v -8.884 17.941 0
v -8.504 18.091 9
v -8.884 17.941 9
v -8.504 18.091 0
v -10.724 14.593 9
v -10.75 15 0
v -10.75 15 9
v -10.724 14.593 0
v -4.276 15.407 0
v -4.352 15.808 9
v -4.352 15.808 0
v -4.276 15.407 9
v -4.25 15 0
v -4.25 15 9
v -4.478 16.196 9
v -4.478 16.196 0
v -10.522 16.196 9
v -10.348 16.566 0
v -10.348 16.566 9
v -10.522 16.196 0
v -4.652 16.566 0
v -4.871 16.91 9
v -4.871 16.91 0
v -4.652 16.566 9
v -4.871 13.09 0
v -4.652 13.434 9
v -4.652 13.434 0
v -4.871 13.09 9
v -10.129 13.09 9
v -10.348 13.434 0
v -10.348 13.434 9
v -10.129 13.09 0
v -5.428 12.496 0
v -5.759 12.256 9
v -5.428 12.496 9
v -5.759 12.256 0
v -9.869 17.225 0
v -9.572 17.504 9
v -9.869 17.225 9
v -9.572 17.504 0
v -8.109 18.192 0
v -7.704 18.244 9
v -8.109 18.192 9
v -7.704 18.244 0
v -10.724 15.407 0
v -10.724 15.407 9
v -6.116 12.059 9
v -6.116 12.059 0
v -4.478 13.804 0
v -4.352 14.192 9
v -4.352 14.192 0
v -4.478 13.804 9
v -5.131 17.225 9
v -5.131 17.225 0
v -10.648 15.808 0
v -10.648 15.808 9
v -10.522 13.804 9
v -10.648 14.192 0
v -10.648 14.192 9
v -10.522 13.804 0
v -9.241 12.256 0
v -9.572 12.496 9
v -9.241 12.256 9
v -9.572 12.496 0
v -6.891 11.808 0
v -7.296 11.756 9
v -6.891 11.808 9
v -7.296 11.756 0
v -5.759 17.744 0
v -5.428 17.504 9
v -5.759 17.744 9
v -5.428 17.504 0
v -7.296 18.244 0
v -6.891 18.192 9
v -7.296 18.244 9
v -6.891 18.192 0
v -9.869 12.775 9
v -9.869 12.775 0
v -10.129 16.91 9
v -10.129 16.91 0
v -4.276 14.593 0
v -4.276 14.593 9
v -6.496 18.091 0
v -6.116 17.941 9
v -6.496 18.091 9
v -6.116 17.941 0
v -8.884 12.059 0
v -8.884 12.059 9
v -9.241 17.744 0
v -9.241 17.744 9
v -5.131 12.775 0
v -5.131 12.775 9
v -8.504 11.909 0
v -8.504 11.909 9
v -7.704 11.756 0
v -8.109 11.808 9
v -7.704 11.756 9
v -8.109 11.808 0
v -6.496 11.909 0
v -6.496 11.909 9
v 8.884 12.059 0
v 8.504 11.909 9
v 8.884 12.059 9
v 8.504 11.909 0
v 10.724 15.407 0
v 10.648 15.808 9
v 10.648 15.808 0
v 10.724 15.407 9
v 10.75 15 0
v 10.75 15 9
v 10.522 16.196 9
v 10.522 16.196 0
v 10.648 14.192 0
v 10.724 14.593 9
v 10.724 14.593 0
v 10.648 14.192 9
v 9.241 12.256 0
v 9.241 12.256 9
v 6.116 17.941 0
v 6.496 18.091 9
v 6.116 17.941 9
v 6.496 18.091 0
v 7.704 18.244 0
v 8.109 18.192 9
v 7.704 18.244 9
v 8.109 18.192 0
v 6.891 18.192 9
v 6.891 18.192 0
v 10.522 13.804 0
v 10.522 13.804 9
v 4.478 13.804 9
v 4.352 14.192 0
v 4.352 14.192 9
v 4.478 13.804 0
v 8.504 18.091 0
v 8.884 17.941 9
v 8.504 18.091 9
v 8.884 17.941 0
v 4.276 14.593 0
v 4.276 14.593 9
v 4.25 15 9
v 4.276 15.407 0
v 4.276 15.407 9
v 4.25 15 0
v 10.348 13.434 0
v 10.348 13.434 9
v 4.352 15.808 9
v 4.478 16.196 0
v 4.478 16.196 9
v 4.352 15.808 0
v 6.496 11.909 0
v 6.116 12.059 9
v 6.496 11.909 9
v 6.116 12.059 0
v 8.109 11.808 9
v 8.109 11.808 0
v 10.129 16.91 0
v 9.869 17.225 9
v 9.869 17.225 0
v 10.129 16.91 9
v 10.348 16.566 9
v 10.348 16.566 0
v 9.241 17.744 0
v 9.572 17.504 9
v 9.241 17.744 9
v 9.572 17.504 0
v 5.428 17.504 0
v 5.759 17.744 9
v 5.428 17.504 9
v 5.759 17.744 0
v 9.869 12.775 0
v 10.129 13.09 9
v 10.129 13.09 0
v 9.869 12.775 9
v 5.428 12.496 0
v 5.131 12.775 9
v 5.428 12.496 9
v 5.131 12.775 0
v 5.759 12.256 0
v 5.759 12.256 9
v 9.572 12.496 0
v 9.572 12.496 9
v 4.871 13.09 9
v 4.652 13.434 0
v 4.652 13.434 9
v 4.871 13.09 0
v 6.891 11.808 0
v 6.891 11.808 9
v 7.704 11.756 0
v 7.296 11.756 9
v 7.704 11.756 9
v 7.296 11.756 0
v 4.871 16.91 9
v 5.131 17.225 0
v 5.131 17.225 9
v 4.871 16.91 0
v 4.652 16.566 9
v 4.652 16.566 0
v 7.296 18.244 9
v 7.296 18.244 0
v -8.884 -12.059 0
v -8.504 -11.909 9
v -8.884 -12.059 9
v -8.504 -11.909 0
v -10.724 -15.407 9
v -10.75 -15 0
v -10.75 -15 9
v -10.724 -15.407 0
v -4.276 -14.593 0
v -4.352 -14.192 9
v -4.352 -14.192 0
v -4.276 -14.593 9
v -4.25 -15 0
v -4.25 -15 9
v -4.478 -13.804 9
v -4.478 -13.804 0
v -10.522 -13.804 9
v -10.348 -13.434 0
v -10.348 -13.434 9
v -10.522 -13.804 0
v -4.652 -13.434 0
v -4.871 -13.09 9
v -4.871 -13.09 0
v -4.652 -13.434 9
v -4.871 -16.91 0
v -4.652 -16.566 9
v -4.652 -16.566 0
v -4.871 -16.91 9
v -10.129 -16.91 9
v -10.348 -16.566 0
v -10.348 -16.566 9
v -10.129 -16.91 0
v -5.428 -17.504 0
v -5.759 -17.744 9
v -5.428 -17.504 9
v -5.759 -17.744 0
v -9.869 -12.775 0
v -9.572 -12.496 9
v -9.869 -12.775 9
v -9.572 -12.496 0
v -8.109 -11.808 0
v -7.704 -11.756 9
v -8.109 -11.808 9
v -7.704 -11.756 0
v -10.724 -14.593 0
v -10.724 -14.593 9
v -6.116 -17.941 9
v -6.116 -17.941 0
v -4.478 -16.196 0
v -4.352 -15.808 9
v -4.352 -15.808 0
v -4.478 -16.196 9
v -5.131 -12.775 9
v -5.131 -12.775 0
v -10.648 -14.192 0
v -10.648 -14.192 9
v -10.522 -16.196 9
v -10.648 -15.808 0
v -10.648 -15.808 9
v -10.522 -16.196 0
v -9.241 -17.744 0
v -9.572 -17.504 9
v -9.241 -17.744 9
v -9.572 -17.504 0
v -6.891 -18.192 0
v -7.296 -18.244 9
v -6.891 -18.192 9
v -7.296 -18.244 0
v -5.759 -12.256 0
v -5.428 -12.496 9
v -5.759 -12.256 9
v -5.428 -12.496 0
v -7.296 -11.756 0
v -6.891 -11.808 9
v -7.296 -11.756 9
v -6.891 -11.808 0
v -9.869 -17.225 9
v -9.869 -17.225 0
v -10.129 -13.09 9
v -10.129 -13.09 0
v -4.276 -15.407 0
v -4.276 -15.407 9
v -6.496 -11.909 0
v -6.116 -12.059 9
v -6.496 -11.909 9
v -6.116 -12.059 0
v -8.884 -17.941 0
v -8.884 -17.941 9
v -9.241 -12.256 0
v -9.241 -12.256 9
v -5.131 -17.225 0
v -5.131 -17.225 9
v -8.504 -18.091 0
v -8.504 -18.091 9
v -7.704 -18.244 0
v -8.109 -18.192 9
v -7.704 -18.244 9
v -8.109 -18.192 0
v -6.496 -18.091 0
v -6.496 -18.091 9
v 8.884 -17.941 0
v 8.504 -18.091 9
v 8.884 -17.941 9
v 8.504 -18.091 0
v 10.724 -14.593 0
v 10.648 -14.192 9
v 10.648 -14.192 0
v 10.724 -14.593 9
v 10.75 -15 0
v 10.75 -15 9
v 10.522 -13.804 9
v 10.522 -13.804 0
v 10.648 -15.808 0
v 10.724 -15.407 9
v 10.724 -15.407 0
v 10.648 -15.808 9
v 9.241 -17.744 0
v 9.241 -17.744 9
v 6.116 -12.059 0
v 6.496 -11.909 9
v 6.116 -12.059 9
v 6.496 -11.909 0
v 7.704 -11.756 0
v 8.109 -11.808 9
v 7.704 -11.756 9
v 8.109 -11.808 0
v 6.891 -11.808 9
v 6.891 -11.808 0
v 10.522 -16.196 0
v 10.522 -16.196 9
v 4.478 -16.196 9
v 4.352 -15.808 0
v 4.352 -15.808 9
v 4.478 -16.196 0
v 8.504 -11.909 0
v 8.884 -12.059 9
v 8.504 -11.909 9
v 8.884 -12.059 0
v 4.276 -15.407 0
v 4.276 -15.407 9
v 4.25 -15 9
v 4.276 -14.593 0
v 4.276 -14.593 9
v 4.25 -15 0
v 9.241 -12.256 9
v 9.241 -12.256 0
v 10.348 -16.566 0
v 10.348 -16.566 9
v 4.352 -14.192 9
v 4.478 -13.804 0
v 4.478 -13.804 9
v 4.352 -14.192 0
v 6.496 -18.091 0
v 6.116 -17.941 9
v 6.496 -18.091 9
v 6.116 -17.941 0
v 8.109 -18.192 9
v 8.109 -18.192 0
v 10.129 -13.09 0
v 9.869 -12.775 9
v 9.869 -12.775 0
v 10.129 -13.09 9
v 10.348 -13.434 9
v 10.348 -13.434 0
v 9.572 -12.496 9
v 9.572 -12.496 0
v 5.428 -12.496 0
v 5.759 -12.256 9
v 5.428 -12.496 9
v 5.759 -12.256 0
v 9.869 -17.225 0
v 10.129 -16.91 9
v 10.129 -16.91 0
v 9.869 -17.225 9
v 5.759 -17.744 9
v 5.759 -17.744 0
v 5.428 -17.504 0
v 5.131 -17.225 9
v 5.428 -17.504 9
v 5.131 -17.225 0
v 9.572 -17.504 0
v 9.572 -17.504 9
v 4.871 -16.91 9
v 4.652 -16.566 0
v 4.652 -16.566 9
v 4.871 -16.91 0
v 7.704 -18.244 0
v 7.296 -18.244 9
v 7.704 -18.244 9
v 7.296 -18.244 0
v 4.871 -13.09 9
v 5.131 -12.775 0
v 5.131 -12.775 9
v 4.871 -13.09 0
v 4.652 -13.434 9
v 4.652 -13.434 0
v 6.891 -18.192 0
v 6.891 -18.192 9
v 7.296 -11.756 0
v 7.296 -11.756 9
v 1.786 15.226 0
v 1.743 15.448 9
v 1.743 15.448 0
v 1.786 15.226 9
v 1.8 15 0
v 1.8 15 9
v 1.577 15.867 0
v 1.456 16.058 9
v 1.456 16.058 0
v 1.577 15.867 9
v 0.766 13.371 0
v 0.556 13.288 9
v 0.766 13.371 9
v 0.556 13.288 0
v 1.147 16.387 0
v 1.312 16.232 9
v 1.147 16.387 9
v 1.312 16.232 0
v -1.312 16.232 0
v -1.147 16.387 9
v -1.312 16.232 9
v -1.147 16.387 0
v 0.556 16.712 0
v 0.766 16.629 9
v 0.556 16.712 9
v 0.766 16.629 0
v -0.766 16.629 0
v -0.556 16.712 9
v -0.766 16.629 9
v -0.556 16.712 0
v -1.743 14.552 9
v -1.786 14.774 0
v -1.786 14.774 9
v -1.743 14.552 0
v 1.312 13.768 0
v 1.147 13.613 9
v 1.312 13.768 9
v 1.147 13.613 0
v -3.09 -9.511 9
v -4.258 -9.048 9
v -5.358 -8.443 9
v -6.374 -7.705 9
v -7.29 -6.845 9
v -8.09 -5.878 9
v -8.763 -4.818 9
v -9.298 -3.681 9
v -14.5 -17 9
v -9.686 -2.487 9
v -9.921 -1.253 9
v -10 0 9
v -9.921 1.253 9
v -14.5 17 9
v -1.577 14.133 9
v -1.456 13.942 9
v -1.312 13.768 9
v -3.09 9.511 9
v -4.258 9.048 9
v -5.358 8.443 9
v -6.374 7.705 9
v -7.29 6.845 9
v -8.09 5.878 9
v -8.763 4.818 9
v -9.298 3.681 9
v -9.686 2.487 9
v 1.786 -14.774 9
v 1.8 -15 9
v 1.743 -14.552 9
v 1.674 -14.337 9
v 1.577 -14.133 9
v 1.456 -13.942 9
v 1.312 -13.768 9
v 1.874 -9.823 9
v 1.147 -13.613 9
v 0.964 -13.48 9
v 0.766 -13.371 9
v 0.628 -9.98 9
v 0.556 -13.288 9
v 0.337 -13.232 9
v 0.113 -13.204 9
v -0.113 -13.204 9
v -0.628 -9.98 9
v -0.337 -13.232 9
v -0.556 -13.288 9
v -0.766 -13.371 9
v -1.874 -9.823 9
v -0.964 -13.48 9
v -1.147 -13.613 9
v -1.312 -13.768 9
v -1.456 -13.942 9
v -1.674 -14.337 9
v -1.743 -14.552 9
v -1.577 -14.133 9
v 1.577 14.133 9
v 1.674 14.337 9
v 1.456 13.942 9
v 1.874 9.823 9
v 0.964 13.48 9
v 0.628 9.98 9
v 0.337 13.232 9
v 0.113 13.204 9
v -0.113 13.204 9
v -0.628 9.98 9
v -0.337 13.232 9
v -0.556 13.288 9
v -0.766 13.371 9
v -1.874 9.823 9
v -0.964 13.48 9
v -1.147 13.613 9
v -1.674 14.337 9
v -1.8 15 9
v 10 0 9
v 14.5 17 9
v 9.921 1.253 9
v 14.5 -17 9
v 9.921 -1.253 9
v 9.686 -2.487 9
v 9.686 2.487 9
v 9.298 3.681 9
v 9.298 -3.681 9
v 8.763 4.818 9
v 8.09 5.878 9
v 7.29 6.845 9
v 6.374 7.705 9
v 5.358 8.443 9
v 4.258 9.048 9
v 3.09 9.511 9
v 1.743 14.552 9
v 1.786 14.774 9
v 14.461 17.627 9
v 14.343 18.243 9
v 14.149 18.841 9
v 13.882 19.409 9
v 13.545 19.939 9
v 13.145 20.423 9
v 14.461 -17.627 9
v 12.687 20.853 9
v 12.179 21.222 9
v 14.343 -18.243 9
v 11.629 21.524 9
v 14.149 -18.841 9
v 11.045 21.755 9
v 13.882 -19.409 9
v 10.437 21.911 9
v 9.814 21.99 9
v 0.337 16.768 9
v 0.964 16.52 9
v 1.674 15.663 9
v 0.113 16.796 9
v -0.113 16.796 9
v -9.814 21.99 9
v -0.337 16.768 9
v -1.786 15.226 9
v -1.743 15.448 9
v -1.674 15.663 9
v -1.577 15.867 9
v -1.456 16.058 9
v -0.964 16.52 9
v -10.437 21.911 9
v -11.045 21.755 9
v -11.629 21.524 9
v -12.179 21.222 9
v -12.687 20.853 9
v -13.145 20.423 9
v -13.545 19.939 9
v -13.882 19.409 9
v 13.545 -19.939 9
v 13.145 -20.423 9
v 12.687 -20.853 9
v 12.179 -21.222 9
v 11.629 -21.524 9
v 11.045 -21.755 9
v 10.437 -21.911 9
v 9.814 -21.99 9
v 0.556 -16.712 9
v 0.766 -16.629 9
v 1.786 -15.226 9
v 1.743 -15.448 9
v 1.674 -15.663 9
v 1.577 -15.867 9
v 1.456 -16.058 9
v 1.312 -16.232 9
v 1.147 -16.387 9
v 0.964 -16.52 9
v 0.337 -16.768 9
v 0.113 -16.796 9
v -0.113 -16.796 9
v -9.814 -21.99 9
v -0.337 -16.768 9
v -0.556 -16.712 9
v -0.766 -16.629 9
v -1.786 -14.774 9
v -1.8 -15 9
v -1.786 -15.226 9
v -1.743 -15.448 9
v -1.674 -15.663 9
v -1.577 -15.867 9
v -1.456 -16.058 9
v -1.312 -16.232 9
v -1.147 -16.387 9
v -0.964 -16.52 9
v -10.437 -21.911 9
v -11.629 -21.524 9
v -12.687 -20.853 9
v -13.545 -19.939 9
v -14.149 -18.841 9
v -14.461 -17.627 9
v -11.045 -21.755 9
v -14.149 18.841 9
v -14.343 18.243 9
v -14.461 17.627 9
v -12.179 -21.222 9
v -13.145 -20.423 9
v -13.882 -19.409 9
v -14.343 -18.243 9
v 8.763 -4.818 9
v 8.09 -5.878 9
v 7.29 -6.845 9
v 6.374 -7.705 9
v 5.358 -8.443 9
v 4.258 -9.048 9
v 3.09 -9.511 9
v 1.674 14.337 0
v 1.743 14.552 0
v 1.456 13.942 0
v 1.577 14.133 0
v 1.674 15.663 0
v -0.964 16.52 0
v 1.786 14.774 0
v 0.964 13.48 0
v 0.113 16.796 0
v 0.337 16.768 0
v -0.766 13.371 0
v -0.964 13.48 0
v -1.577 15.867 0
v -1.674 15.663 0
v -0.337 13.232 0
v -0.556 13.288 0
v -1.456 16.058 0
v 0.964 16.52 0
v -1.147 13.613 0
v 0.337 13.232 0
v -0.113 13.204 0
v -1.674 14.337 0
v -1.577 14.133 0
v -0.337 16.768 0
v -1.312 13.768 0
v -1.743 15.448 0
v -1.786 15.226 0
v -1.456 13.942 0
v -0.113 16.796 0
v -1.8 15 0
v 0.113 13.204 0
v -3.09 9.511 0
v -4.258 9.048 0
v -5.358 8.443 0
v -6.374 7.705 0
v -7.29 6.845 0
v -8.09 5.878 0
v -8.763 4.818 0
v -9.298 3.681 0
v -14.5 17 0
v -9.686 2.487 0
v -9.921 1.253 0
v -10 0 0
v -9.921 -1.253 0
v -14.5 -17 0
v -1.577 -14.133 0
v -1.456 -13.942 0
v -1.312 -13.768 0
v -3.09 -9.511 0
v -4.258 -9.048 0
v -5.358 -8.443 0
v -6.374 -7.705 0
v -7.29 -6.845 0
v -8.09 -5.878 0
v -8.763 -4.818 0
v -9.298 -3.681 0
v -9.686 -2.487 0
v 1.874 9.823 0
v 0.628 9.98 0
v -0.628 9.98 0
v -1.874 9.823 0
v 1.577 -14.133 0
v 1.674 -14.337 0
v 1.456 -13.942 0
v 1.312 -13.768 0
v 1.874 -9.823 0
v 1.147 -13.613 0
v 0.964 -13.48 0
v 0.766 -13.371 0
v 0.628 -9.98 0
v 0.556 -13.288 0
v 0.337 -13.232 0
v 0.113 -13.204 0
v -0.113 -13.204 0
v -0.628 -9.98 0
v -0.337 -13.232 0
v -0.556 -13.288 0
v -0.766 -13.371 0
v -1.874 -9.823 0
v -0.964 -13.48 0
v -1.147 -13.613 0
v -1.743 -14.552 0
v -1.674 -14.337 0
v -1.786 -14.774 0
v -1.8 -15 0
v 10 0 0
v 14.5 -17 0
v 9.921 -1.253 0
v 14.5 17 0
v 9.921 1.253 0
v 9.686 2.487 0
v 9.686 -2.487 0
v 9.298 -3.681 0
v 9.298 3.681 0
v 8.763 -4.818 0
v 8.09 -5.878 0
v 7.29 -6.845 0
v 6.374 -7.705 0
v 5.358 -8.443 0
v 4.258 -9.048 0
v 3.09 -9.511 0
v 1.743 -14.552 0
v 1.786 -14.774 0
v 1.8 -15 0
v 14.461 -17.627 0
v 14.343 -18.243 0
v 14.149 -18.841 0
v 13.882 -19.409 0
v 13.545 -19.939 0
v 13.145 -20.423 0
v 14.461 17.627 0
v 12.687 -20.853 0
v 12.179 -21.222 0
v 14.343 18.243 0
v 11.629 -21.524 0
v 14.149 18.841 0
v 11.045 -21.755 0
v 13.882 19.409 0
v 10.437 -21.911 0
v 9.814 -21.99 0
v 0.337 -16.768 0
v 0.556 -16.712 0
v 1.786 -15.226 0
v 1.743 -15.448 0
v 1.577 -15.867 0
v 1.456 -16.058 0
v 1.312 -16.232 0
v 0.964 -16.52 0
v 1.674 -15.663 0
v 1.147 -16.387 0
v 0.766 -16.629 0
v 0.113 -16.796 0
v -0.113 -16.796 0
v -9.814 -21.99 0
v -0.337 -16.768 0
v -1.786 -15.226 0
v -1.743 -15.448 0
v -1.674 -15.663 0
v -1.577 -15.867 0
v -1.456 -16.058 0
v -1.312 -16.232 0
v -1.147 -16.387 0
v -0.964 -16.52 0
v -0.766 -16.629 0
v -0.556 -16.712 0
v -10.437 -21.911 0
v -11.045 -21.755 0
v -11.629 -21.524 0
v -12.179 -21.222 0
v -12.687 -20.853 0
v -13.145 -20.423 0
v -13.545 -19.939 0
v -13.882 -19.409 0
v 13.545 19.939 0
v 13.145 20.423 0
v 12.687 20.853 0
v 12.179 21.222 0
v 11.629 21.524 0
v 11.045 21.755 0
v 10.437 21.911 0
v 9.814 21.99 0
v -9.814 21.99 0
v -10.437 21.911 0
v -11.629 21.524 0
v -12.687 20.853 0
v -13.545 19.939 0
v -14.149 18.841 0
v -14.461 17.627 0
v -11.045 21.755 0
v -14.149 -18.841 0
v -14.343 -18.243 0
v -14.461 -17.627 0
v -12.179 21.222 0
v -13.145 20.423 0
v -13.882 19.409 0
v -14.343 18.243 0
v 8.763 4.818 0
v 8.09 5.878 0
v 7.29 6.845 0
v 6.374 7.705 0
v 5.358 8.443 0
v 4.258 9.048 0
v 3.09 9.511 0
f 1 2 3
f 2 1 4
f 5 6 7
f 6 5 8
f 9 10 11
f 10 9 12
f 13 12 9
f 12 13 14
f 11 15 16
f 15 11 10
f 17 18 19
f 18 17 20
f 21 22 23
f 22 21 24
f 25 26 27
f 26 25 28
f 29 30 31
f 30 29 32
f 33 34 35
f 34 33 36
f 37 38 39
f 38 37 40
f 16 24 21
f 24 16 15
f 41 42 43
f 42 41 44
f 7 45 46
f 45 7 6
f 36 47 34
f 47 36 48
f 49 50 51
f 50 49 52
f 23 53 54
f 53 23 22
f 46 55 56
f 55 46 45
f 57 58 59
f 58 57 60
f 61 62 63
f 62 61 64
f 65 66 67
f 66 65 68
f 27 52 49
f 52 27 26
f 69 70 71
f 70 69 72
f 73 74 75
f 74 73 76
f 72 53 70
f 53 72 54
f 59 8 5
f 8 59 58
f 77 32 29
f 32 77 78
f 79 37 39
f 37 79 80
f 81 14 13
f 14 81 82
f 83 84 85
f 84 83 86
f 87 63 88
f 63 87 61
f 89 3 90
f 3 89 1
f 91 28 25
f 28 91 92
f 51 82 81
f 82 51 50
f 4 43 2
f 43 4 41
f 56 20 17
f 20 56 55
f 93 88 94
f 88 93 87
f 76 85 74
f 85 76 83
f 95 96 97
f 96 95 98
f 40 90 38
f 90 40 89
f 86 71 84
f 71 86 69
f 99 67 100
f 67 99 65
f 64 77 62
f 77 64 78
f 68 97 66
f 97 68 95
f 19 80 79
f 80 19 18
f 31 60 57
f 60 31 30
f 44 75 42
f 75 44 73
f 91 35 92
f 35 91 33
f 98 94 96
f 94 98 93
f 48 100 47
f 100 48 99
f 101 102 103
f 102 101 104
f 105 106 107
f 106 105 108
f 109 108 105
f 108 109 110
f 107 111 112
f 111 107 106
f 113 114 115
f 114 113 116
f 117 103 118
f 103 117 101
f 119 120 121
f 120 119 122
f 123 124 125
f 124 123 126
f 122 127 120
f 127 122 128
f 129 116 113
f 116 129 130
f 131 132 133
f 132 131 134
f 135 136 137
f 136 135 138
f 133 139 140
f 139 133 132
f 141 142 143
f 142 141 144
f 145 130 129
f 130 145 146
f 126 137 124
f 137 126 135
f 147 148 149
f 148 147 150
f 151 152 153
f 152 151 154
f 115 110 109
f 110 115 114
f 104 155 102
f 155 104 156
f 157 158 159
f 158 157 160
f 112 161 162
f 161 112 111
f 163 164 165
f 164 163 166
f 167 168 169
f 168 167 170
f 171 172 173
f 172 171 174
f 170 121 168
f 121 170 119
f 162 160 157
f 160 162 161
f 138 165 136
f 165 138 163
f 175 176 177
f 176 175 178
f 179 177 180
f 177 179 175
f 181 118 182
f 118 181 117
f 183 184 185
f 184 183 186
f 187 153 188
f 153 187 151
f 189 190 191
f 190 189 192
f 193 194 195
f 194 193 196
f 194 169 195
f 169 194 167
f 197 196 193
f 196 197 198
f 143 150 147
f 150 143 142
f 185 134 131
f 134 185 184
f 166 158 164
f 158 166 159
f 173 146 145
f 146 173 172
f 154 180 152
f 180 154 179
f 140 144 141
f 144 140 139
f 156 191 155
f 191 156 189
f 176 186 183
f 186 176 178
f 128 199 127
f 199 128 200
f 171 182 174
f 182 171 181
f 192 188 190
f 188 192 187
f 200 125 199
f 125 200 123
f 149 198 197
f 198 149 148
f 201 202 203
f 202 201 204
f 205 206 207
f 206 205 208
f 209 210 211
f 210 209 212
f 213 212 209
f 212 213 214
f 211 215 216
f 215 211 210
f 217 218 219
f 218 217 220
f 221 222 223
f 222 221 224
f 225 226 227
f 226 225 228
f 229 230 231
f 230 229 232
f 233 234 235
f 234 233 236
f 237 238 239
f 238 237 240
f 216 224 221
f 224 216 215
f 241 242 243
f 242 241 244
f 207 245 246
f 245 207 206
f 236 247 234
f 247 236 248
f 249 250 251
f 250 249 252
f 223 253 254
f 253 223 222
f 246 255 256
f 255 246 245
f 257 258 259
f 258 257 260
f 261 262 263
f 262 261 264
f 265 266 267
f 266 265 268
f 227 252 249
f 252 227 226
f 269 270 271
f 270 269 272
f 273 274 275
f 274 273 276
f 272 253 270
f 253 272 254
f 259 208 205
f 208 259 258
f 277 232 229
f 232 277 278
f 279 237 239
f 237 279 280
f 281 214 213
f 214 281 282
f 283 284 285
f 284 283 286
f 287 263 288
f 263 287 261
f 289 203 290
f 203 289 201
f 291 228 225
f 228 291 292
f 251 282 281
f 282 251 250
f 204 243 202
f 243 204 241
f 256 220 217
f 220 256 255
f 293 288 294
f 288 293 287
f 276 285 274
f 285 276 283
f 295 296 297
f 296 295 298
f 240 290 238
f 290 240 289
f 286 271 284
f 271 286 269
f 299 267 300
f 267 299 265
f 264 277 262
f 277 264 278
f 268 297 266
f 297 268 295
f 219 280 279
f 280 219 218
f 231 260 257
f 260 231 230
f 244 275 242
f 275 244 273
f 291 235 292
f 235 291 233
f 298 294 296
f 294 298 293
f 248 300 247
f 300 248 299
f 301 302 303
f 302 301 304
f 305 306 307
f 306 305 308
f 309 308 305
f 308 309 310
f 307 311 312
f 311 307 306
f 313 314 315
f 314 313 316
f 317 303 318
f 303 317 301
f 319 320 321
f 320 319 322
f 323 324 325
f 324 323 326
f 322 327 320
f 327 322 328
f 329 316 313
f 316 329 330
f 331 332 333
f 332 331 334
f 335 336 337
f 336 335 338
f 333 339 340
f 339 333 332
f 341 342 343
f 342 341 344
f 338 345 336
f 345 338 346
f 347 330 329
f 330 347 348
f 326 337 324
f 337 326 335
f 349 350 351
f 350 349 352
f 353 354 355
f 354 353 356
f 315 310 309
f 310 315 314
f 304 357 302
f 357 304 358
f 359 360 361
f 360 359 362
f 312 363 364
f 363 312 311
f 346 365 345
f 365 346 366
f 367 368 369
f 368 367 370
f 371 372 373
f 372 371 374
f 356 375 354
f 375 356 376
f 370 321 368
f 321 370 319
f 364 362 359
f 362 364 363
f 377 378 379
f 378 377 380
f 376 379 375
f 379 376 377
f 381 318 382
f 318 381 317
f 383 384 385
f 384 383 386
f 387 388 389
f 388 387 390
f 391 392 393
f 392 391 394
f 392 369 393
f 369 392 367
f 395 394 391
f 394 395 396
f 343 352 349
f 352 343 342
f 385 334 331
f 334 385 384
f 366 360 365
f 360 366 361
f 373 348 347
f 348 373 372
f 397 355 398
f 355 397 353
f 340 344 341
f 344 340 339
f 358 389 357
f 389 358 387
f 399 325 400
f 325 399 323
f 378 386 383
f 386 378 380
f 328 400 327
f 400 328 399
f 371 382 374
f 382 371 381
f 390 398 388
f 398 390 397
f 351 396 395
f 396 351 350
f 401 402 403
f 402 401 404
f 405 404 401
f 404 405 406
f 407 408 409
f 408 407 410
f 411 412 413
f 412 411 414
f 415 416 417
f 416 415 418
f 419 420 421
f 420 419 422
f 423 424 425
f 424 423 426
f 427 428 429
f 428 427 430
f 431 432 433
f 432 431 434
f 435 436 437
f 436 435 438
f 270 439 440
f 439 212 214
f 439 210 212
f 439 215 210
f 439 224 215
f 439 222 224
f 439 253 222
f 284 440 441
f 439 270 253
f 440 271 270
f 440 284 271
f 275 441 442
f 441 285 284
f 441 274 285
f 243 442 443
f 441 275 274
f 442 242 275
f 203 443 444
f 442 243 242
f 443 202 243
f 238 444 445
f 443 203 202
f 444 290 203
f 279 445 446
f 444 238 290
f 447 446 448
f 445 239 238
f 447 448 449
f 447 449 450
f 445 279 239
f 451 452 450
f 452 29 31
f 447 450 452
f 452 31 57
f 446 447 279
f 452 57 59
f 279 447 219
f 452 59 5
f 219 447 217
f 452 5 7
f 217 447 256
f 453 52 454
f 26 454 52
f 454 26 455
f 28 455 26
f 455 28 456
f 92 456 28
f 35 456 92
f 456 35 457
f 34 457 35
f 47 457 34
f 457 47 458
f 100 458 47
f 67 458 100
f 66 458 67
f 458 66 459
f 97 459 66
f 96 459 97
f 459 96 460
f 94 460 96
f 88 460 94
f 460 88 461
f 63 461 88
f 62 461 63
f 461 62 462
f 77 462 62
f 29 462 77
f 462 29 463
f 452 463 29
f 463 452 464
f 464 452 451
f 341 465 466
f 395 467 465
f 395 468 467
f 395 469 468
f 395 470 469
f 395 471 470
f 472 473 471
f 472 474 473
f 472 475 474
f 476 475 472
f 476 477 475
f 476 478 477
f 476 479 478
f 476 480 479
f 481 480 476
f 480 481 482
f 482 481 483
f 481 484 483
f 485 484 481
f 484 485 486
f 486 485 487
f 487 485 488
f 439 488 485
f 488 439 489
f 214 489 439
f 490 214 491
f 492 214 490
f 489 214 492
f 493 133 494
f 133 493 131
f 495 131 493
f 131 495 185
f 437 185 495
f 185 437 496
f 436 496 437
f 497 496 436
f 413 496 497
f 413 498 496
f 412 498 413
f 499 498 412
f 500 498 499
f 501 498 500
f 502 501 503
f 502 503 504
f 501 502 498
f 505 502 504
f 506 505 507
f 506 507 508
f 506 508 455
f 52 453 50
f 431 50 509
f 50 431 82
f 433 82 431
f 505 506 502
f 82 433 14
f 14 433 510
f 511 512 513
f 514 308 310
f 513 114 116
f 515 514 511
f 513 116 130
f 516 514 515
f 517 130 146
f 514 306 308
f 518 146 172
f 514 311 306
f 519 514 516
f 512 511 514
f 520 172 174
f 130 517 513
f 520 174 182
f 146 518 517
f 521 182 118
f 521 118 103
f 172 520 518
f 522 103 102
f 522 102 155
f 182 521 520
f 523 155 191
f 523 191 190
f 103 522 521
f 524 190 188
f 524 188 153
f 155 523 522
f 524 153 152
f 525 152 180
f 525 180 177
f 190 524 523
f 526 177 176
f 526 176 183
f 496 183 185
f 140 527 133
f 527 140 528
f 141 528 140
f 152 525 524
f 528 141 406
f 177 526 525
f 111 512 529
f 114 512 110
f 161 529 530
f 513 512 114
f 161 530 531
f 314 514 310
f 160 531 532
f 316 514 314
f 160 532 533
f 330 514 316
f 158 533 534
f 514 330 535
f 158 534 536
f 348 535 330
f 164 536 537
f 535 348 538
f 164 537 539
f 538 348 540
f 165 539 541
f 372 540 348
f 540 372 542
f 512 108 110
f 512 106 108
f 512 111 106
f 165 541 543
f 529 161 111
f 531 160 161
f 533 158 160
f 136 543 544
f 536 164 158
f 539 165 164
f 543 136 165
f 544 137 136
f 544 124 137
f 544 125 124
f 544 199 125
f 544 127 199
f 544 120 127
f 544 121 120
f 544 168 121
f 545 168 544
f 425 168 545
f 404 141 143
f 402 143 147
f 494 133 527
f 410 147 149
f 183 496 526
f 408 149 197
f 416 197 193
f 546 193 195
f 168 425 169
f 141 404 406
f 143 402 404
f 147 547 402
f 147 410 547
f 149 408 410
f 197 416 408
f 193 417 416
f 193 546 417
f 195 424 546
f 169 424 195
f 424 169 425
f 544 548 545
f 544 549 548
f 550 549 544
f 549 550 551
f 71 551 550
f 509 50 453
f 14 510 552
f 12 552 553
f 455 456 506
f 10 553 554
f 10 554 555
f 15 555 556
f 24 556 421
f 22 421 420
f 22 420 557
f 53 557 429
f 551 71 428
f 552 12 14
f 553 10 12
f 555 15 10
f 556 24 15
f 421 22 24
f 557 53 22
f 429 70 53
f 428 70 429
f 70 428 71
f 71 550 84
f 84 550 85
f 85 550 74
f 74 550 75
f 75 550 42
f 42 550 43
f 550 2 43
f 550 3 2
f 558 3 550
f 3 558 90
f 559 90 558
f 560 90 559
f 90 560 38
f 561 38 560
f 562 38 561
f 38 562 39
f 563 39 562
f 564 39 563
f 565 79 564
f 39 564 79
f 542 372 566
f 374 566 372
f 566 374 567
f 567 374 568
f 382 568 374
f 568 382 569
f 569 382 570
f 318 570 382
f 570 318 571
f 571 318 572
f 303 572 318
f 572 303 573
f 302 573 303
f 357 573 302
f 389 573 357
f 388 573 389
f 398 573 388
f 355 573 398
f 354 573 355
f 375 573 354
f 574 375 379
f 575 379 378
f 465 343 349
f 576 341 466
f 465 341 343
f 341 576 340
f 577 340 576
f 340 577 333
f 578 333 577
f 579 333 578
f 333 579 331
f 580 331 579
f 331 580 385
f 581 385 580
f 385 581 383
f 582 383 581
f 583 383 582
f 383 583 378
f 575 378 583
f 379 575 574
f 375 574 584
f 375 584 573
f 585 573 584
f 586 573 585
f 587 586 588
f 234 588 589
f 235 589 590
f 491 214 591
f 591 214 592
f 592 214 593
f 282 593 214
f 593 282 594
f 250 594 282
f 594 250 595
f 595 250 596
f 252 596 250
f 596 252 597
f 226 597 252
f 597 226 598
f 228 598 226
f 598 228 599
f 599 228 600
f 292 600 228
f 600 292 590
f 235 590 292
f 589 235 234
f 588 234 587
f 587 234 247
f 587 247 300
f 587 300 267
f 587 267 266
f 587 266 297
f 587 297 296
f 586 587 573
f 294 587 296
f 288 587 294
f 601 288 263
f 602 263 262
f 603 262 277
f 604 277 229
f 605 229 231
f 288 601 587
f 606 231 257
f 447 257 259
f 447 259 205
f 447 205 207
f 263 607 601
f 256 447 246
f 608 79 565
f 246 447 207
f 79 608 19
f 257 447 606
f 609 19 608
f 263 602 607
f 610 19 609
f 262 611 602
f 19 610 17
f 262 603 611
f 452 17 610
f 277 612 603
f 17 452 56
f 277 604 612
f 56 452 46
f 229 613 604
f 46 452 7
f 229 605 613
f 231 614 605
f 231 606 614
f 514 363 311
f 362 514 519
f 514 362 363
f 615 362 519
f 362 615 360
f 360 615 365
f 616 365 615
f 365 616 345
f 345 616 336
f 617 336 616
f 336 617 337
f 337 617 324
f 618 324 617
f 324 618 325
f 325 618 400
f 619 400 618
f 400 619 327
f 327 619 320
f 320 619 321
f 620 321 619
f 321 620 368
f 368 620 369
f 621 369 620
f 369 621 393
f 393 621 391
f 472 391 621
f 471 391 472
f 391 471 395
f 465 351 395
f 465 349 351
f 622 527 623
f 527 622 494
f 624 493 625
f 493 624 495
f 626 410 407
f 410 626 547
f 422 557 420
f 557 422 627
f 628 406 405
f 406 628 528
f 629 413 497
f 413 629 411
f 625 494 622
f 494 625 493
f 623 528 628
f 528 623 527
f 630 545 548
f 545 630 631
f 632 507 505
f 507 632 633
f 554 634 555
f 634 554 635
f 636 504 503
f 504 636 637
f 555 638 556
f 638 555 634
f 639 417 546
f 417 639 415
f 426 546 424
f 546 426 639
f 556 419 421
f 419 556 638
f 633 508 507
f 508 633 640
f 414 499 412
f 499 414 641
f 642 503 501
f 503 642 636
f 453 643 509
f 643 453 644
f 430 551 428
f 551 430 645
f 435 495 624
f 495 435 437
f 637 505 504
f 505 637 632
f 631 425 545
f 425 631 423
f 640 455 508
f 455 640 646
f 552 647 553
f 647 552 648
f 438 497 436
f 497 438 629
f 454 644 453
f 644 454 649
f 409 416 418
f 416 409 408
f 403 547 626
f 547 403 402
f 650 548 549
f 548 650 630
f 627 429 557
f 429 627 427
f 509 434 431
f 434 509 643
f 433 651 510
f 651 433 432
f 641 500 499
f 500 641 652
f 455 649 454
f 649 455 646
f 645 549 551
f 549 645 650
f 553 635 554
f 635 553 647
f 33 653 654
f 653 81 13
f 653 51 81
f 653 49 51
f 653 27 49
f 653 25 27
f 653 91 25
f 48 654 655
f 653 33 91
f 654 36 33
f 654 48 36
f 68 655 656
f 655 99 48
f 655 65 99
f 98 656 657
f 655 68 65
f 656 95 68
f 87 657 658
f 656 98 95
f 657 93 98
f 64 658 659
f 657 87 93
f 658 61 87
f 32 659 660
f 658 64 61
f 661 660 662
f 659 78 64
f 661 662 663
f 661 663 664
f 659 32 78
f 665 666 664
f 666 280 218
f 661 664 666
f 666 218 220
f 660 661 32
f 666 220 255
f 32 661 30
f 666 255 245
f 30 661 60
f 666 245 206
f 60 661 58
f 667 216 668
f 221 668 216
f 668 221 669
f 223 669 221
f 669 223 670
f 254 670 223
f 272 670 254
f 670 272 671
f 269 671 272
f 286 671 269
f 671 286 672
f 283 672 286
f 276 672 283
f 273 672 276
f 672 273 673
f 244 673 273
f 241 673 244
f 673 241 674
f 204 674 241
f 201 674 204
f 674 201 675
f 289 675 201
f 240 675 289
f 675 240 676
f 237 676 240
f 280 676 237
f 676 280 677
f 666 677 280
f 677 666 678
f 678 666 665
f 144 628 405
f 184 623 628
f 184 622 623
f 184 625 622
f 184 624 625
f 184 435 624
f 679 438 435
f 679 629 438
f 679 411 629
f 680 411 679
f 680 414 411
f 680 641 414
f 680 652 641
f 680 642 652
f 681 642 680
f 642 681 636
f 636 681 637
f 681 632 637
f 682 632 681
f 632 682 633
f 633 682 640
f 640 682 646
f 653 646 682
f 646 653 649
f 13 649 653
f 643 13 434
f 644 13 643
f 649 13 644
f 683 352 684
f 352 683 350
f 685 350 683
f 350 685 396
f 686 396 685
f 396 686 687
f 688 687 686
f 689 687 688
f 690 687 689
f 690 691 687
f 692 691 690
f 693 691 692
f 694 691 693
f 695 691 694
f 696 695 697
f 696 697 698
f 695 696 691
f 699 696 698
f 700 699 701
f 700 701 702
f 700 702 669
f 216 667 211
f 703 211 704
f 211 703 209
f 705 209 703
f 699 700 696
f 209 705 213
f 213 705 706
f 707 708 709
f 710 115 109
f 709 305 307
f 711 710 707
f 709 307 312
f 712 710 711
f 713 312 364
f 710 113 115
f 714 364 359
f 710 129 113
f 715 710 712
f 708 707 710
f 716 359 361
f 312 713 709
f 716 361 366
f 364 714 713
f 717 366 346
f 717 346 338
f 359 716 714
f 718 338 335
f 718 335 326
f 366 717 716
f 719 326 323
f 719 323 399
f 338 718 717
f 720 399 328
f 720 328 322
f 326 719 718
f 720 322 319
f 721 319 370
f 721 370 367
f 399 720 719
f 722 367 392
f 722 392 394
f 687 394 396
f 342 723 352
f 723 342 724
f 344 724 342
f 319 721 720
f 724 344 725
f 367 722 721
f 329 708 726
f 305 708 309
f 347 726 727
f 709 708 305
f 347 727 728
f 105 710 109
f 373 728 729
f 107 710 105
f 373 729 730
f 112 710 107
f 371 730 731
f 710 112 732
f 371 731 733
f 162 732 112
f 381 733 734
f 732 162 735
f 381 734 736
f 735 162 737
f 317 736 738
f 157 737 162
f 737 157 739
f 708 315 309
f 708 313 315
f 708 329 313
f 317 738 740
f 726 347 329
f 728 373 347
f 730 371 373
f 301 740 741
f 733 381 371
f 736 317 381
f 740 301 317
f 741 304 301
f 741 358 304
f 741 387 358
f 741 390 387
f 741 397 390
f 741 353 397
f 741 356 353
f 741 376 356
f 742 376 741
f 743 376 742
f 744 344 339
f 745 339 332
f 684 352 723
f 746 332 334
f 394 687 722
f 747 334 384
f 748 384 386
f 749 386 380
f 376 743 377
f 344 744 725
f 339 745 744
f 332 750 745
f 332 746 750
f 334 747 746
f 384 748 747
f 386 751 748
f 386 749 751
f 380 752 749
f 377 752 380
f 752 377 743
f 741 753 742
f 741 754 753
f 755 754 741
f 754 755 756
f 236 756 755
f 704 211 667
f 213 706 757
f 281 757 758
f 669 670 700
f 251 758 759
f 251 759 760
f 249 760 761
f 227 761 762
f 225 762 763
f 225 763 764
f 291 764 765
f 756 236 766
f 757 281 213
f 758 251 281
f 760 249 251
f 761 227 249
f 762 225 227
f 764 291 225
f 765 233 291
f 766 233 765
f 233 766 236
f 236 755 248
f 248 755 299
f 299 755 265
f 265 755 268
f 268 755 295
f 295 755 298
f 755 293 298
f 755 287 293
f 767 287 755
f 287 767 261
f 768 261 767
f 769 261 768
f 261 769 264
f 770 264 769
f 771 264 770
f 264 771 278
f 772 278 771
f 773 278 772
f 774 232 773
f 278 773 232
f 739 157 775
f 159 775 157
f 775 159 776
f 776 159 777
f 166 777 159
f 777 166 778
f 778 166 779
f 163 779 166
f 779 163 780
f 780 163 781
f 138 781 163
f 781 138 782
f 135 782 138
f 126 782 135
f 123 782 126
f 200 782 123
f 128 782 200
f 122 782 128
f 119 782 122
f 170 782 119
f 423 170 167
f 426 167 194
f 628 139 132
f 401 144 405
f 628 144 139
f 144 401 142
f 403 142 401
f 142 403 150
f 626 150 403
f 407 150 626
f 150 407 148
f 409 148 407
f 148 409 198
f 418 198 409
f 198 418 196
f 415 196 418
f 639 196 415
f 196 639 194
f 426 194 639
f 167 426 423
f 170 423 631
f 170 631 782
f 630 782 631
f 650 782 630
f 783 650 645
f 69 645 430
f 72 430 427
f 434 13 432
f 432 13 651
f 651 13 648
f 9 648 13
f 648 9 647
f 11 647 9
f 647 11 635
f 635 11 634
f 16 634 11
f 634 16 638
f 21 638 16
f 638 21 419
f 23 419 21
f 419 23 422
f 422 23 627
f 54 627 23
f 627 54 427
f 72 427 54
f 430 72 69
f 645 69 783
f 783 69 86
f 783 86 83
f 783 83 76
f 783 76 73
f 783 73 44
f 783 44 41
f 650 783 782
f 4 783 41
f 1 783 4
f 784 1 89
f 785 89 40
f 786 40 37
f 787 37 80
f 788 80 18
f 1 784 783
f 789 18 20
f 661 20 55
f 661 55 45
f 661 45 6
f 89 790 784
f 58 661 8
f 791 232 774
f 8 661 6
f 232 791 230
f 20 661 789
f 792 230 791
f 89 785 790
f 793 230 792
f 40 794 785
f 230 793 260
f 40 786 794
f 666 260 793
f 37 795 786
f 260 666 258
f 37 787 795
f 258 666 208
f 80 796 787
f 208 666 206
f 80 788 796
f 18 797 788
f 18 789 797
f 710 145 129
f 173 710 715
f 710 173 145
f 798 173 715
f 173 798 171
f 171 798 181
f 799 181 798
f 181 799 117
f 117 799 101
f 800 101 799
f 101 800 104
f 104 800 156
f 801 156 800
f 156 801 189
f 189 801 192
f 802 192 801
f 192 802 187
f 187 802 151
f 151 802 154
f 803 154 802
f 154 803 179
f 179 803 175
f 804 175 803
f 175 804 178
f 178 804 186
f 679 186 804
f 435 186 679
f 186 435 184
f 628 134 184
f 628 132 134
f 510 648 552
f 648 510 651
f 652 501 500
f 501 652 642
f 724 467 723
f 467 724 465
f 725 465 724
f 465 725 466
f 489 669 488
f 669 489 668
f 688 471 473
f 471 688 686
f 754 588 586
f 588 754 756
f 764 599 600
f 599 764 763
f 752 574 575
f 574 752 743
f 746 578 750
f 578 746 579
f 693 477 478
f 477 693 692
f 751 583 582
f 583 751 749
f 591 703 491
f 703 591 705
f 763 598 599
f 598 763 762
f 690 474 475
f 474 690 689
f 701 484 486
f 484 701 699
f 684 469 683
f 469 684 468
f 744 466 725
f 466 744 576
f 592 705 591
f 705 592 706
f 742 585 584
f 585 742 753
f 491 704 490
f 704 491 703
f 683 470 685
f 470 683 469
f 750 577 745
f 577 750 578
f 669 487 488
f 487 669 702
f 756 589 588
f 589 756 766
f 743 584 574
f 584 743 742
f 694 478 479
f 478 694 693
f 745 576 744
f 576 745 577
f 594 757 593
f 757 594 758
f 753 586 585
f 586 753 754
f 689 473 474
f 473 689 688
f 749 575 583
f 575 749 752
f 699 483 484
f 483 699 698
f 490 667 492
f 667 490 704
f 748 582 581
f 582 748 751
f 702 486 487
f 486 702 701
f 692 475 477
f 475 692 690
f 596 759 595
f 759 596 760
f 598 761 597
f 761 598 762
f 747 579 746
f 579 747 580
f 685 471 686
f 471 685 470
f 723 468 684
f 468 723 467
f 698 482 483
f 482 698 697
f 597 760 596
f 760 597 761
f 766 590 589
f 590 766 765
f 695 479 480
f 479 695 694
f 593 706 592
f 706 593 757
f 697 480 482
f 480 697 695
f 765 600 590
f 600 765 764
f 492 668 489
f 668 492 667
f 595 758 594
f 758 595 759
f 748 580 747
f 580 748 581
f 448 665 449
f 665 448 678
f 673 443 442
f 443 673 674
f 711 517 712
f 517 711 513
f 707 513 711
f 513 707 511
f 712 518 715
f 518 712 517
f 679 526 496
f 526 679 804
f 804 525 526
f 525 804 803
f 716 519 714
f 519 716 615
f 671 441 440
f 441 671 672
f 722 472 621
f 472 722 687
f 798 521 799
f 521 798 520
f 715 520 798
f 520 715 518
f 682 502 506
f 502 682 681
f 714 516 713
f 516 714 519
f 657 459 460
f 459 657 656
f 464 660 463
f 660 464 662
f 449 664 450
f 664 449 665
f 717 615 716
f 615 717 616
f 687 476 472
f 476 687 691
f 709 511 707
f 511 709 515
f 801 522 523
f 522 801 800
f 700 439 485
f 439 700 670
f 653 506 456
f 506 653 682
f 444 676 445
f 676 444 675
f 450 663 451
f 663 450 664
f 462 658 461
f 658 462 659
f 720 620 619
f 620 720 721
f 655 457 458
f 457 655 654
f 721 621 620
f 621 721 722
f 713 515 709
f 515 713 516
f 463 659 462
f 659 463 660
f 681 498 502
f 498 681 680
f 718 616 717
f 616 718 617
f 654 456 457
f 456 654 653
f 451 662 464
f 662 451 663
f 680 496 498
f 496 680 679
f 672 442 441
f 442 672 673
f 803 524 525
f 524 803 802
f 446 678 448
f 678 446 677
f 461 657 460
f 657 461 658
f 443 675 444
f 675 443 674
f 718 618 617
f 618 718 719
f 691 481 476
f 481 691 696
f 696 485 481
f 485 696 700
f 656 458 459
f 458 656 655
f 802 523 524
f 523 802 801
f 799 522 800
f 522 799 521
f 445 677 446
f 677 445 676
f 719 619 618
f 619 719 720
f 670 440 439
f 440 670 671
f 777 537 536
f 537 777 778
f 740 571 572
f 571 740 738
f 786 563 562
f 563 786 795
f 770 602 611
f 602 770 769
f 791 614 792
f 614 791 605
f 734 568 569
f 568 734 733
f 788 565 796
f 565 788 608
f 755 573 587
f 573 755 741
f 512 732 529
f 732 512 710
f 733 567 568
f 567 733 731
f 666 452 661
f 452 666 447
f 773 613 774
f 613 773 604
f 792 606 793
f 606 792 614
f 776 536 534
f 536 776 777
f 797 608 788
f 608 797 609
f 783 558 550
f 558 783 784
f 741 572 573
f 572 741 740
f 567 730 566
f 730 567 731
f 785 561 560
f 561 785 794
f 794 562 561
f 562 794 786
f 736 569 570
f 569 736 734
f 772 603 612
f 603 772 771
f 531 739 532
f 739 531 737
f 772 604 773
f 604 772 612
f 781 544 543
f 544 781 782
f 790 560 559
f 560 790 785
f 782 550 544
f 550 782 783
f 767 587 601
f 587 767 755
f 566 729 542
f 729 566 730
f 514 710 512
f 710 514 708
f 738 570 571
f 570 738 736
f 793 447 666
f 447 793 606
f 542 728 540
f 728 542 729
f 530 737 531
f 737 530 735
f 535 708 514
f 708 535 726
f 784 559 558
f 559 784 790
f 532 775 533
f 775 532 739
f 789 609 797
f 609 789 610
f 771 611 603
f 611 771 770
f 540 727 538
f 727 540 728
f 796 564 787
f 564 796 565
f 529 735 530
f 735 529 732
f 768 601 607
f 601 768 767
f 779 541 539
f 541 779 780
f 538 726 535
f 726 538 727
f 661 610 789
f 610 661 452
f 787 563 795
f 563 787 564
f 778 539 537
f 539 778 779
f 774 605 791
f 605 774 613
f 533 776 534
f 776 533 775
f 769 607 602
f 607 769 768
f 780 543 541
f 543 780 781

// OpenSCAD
$fn = 50;


difference() {
	union() {
		hull() {
			translate(v = [-9.5000000000, 17.0000000000, 0]) {
				cylinder(h = 9, r = 5);
			}
			translate(v = [9.5000000000, 17.0000000000, 0]) {
				cylinder(h = 9, r = 5);
			}
			translate(v = [-9.5000000000, -17.0000000000, 0]) {
				cylinder(h = 9, r = 5);
			}
			translate(v = [9.5000000000, -17.0000000000, 0]) {
				cylinder(h = 9, r = 5);
			}
		}
	}
	union() {
		#translate(v = [-7.5000000000, 15.0000000000, 0]) {
			cylinder(h = 9, r = 3.2500000000);
		}
		#translate(v = [7.5000000000, 15.0000000000, 0]) {
			cylinder(h = 9, r = 3.2500000000);
		}
		#translate(v = [-7.5000000000, -15.0000000000, 0]) {
			cylinder(h = 9, r = 3.2500000000);
		}
		#translate(v = [7.5000000000, -15.0000000000, 0]) {
			cylinder(h = 9, r = 3.2500000000);
		}
		#translate(v = [-7.5000000000, -15.0000000000, -100.0000000000]) {
			cylinder(h = 200, r = 3.2500000000);
		}
		#translate(v = [-7.5000000000, 15.0000000000, -100.0000000000]) {
			cylinder(h = 200, r = 3.2500000000);
		}
		#translate(v = [7.5000000000, -15.0000000000, -100.0000000000]) {
			cylinder(h = 200, r = 3.2500000000);
		}
		#translate(v = [7.5000000000, 15.0000000000, -100.0000000000]) {
			cylinder(h = 200, r = 3.2500000000);
		}
		#translate(v = [-7.5000000000, 15.0000000000, 0]) {
			cylinder(h = 9, r = 1.8000000000);
		}
		#translate(v = [0.0000000000, 15.0000000000, 0]) {
			cylinder(h = 9, r = 1.8000000000);
		}
		#translate(v = [7.5000000000, 15.0000000000, 0]) {
			cylinder(h = 9, r = 1.8000000000);
		}
		#translate(v = [-7.5000000000, -15.0000000000, 0]) {
			cylinder(h = 9, r = 1.8000000000);
		}
		#translate(v = [0.0000000000, -15.0000000000, 0]) {
			cylinder(h = 9, r = 1.8000000000);
		}
		#translate(v = [7.5000000000, -15.0000000000, 0]) {
			cylinder(h = 9, r = 1.8000000000);
		}
		#translate(v = [-7.5000000000, 15.0000000000, 0]) {
			cylinder(h = 9, r = 1.8000000000);
		}
		#translate(v = [0.0000000000, 15.0000000000, 0]) {
			cylinder(h = 9, r = 1.8000000000);
		}
		#translate(v = [7.5000000000, 15.0000000000, 0]) {
			cylinder(h = 9, r = 1.8000000000);
		}
		#translate(v = [-7.5000000000, -15.0000000000, 0]) {
			cylinder(h = 9, r = 1.8000000000);
		}
		#translate(v = [0.0000000000, -15.0000000000, 0]) {
			cylinder(h = 9, r = 1.8000000000);
		}
		#translate(v = [7.5000000000, -15.0000000000, 0]) {
			cylinder(h = 9, r = 1.8000000000);
		}
		#translate(v = [-7.5000000000, 15.0000000000, 0]) {
			cylinder(h = 9, r = 1.8000000000);
		}
		#translate(v = [0.0000000000, 15.0000000000, 0]) {
			cylinder(h = 9, r = 1.8000000000);
		}
		#translate(v = [7.5000000000, 15.0000000000, 0]) {
			cylinder(h = 9, r = 1.8000000000);
		}
		#translate(v = [-7.5000000000, -15.0000000000, 0]) {
			cylinder(h = 9, r = 1.8000000000);
		}
		#translate(v = [0.0000000000, -15.0000000000, 0]) {
			cylinder(h = 9, r = 1.8000000000);
		}
		#translate(v = [7.5000000000, -15.0000000000, 0]) {
			cylinder(h = 9, r = 1.8000000000);
		}
		#cylinder(h = 9, r = 10.0000000000);
	}
}
